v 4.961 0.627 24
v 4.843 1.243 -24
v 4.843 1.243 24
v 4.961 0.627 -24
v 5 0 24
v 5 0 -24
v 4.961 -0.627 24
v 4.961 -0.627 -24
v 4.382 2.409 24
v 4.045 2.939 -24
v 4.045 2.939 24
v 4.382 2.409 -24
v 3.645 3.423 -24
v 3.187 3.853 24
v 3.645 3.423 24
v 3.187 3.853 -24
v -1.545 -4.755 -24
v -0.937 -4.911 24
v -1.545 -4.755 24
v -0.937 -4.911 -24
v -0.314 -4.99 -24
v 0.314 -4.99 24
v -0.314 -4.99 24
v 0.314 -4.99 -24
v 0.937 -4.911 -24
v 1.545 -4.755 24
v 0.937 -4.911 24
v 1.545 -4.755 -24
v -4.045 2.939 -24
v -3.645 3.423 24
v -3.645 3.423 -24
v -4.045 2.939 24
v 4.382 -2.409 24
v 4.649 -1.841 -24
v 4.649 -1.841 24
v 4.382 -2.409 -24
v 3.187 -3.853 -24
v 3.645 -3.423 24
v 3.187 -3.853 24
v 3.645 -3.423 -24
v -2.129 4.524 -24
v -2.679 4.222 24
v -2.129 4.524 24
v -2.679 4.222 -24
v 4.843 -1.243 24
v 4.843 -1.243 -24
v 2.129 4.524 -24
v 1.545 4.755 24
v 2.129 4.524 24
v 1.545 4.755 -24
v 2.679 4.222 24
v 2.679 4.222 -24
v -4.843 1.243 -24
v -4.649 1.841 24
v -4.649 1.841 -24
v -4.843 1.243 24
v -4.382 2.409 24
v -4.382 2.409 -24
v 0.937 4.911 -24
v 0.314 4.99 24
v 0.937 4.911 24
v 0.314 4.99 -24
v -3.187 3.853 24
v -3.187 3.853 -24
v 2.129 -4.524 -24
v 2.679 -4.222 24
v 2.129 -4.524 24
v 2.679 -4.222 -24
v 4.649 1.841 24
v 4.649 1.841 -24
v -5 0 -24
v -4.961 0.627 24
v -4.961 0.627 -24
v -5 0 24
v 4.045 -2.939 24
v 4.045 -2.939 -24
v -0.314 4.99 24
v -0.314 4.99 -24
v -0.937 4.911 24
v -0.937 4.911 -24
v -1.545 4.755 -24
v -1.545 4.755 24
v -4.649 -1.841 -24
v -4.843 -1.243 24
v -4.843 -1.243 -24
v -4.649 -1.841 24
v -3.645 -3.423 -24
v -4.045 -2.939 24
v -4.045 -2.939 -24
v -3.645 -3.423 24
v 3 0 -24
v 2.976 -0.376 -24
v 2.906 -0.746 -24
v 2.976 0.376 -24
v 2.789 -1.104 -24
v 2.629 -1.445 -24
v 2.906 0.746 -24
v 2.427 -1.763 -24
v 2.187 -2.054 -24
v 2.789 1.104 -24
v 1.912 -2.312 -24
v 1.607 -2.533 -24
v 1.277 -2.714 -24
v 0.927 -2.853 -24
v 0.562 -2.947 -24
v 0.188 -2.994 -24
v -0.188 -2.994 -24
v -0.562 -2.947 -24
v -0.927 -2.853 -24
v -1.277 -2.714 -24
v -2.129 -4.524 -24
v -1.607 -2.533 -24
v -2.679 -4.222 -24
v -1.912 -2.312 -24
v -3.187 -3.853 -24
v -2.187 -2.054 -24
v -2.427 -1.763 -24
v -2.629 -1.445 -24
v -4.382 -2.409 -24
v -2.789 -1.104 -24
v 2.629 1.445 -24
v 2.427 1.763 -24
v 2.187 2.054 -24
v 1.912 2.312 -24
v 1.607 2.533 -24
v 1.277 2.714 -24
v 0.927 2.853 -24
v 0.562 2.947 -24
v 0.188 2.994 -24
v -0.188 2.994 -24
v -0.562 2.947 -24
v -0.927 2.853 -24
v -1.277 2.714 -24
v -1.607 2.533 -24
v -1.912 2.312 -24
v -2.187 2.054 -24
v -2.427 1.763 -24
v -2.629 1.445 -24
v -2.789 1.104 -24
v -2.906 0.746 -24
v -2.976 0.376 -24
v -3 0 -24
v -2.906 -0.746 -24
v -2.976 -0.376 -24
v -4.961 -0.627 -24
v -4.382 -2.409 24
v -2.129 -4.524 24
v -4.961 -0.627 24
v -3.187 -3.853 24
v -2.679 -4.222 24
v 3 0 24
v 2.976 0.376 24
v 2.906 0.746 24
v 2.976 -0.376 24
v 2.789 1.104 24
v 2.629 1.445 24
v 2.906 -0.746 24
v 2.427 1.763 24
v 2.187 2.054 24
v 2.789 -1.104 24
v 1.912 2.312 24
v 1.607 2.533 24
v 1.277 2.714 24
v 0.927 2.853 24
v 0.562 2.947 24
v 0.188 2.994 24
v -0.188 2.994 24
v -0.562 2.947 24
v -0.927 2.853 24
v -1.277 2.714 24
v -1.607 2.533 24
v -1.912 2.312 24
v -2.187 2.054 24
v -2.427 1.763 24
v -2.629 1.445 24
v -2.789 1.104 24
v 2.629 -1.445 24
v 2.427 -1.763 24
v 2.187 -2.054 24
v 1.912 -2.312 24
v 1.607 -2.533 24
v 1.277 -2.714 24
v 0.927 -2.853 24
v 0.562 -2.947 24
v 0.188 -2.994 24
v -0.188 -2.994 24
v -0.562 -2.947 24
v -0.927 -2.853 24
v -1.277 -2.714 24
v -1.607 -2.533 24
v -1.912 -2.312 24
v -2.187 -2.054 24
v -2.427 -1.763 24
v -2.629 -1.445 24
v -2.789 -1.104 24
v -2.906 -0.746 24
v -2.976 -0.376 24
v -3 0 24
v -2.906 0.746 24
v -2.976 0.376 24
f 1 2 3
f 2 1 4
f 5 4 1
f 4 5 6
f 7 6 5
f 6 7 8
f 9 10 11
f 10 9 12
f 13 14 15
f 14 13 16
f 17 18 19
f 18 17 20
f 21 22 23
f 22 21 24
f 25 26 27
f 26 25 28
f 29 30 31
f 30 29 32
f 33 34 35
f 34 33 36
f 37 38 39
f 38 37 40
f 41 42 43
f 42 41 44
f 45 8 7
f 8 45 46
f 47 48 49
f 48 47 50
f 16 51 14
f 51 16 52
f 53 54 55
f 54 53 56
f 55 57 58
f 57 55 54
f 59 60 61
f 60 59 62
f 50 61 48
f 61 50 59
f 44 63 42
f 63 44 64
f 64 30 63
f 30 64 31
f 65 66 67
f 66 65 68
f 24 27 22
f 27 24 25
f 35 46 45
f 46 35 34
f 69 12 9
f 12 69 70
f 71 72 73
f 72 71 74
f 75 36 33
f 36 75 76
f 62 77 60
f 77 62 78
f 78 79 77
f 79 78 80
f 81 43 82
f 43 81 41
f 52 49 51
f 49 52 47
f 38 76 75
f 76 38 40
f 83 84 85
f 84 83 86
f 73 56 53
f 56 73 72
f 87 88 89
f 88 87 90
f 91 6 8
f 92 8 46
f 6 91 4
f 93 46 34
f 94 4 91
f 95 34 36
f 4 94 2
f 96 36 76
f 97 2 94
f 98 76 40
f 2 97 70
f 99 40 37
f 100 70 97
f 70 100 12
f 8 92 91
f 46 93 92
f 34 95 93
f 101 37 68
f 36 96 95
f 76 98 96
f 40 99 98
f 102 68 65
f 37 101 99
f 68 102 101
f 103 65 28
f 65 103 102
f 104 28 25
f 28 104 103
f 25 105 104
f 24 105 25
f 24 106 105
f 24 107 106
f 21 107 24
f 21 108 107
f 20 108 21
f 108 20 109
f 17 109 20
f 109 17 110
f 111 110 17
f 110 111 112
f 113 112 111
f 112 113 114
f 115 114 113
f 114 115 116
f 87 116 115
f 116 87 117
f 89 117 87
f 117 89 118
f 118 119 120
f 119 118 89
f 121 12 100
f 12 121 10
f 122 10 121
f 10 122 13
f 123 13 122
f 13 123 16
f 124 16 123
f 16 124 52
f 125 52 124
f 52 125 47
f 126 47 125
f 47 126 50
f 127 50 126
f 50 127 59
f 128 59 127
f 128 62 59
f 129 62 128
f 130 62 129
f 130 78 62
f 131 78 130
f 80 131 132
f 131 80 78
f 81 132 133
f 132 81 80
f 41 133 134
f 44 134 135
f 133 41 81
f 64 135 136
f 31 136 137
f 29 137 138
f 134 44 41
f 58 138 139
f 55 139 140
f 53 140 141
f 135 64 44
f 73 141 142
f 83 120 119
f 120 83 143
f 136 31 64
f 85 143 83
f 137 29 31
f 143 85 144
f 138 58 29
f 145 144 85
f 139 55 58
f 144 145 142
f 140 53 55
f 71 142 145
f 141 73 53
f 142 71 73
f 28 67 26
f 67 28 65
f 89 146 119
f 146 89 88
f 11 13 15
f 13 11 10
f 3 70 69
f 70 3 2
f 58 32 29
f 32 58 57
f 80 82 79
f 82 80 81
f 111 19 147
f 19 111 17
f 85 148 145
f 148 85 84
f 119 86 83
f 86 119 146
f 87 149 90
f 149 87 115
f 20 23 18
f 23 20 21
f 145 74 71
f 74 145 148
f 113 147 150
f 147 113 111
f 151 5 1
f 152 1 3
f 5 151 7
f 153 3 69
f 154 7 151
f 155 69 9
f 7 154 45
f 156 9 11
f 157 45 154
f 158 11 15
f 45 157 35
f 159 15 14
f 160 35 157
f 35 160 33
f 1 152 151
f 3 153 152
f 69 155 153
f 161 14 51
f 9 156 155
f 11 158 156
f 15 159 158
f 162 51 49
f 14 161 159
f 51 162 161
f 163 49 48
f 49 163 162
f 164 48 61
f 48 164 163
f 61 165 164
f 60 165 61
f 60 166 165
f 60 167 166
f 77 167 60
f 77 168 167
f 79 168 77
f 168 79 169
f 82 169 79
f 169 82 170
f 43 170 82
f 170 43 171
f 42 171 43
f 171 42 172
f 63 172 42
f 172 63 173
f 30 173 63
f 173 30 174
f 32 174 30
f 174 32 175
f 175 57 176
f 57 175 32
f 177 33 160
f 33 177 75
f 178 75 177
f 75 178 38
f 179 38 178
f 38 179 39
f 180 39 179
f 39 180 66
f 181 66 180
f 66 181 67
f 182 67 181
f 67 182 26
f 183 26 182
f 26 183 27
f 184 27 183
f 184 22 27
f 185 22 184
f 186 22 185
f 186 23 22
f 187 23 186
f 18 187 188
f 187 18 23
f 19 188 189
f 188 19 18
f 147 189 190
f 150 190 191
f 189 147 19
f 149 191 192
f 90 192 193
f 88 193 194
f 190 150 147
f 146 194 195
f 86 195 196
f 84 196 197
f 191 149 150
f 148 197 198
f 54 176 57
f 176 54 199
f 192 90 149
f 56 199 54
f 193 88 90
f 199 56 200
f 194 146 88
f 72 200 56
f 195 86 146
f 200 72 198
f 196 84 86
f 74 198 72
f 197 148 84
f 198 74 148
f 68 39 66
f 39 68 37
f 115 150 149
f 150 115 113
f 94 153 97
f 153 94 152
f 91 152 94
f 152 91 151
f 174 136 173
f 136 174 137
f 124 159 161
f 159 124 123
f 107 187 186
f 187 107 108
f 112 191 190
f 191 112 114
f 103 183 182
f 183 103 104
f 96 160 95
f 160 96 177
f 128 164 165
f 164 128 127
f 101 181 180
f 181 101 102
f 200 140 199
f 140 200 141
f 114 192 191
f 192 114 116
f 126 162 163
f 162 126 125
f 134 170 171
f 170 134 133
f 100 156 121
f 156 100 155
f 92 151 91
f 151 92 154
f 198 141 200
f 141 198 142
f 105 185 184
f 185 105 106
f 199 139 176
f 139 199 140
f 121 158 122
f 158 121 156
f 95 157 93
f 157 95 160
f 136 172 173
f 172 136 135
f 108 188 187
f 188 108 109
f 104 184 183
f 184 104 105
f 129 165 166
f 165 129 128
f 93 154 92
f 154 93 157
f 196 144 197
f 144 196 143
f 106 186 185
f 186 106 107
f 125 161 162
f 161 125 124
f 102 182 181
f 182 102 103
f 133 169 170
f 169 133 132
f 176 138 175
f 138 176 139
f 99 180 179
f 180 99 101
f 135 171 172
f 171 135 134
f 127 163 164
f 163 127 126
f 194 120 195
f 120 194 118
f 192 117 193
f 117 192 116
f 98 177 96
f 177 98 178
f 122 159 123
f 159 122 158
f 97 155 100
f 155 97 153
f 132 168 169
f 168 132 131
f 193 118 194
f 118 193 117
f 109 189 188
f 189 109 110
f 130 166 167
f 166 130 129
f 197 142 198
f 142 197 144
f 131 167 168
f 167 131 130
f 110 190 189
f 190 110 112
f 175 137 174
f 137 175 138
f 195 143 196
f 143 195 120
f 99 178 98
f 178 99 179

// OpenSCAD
$fn = 50;


difference() {
	union() {
		translate(v = [0, 0, -24.0000000000]) {
			cylinder(h = 48, r = 5.0000000000);
		}
	}
	union() {
		translate(v = [0, 0, -100.0000000000]) {
			cylinder(h = 200, r = 3.0000000000);
		}
	}
}
